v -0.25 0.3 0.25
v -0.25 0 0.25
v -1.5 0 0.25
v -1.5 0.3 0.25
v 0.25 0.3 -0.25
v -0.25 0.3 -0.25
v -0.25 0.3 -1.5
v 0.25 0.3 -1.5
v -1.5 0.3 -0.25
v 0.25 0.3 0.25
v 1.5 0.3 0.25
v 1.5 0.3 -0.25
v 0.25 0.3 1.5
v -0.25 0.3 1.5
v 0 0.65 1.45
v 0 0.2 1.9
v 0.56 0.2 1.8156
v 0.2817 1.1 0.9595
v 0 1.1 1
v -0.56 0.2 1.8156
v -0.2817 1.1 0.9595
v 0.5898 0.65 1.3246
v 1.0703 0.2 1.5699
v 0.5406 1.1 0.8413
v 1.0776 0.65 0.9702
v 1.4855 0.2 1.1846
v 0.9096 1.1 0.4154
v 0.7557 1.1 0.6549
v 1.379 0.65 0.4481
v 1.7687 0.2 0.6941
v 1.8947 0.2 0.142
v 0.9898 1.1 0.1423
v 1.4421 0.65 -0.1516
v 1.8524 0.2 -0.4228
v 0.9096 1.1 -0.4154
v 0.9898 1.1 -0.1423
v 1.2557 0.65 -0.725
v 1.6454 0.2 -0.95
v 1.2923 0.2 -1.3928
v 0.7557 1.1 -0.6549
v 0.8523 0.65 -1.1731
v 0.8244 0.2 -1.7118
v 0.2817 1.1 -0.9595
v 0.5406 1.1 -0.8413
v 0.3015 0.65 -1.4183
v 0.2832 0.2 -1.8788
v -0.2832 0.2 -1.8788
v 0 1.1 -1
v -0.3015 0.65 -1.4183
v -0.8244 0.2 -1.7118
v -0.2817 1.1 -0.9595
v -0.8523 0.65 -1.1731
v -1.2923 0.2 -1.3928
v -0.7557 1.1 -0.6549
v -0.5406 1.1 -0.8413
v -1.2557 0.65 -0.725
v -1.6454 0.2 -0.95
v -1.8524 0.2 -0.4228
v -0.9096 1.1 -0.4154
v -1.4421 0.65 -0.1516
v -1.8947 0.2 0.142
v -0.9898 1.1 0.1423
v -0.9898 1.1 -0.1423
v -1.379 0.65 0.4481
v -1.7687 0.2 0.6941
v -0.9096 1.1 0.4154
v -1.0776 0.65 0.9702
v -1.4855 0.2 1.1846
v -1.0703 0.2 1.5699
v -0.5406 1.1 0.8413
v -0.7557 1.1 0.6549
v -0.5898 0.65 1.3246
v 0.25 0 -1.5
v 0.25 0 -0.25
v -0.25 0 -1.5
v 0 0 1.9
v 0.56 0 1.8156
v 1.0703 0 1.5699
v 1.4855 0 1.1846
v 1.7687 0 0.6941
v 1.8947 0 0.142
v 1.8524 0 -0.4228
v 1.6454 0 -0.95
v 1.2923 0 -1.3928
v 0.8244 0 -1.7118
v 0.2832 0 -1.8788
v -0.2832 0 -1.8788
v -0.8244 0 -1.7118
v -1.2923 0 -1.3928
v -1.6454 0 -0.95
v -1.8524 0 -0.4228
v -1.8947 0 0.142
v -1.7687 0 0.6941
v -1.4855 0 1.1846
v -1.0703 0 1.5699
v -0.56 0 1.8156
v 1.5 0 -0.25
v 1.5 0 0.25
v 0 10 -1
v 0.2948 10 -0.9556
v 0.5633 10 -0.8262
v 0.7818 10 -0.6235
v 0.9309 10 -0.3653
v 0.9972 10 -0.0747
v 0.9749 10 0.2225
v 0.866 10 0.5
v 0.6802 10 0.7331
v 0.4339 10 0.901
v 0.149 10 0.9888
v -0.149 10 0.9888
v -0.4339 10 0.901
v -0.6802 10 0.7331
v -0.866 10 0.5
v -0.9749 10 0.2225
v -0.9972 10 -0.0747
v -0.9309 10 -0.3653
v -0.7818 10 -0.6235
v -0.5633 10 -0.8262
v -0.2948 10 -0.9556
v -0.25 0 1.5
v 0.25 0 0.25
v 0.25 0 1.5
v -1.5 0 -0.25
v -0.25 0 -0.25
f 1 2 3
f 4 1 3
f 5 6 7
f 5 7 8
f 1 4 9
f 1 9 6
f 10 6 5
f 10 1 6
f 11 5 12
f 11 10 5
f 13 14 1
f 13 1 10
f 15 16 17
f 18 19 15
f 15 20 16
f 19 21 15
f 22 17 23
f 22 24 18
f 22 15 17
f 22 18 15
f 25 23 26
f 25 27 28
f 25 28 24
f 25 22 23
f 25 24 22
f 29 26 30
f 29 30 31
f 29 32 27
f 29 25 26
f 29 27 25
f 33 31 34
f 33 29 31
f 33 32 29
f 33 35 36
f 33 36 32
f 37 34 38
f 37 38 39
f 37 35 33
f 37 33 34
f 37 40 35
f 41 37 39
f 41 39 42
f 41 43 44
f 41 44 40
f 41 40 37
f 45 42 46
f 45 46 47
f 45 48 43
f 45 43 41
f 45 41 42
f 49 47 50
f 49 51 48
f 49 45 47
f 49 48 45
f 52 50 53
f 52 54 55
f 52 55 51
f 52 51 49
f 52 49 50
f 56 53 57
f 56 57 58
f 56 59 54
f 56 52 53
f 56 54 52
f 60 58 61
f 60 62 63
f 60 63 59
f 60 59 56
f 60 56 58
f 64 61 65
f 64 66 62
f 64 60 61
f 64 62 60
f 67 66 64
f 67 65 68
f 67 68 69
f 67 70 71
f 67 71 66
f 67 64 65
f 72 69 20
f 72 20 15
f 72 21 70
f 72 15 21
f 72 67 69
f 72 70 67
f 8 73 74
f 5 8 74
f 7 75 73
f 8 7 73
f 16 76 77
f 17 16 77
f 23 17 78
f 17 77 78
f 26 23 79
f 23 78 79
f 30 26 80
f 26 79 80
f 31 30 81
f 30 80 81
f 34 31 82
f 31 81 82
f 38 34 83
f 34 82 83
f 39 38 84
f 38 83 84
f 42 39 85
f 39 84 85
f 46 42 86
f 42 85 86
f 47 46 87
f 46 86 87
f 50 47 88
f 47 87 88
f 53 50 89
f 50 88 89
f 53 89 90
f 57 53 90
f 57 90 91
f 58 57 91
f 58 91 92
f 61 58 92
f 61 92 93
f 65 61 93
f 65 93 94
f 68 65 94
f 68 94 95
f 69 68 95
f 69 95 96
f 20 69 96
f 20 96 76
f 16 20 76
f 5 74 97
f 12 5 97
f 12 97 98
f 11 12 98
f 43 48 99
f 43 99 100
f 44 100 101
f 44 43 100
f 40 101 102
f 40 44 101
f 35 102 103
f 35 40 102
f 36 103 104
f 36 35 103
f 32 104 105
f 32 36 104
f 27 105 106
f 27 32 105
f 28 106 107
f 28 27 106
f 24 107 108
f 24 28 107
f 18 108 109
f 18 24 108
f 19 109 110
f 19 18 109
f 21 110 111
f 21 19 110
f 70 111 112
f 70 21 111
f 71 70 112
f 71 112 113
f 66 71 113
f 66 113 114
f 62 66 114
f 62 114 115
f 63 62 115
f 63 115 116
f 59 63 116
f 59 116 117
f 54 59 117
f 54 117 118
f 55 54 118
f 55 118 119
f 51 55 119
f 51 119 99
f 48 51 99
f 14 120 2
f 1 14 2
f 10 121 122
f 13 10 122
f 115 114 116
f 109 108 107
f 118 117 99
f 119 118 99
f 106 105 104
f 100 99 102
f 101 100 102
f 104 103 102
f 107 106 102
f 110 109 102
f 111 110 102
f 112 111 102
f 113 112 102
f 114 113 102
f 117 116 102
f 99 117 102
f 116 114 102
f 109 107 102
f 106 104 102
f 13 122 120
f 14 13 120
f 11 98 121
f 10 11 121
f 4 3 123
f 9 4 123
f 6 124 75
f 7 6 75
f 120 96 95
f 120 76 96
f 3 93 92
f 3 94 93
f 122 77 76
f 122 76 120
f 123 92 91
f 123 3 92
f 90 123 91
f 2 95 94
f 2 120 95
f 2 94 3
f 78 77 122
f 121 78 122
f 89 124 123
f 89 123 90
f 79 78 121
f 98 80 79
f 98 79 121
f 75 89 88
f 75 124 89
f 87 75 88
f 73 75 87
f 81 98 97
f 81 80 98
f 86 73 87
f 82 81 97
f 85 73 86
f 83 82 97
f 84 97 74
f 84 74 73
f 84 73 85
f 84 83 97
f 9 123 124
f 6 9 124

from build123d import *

# Parameters (mm, degrees)
SKETCH1_R           = 1.9
BOSS_EXTRUDE1_DEPTH = 1.3
SKETCH2_R           = 1
BOSS_EXTRUDE2_DEPTH = 10
CHAMFER1_SIZE       = 1.1
CUT_EXTRUDE1_DEPTH  = 0.3


with BuildPart() as part:
    # Sketch1 → Boss-Extrude1 (new body)
    with BuildSketch(Plane(origin=(0, 0, 0), x_dir=(1, 0, 0), z_dir=(0, 1, 0))):
        with Locations(Location((0, 0, 0), (0, 0, 270))):
            Circle(SKETCH1_R)
    extrude(amount=BOSS_EXTRUDE1_DEPTH)

    # Sketch2 → Boss-Extrude2 (add)
    with BuildSketch(Plane.XZ):
        with Locations(Location((0, 0, 0), (0, 0, 270))):
            Circle(SKETCH2_R)
    extrude(amount=-BOSS_EXTRUDE2_DEPTH)

    # Chamfer1
    # the kernel refuses this chamfer: 1.1 mm, written as the material it takes off along each edge
    with BuildSketch(Plane(origin=(0, 1.3, 0), x_dir=(0, 0, 1), z_dir=(-1, 0, 0))) as chamfer1_piece_1_section:
        Polygon((1.9, -CHAMFER1_SIZE), (1.9 - CHAMFER1_SIZE, 0), (1.9, 0), align=None)
    chamfer1_piece_1 = revolve(axis=Axis((0, 1.3, 0), (0, 1, 0)), mode=Mode.PRIVATE)
    chamfer1_piece_1 = chamfer1_piece_1 - Plane(origin=(0, 0.647474875, 0), x_dir=(0, 0, -1), z_dir=(0, -1, 0)) * Cylinder(1, 8, mode=Mode.PRIVATE)
    add(chamfer1_piece_1, mode=Mode.SUBTRACT)

    # Sketch3 → Cut-Extrude1 (cut)
    with BuildSketch(Plane.XZ):
        Polygon((-0.25, 1.5), (-0.25, 0.25), (-1.5, 0.25), (-1.5, -0.25), (-0.25, -0.25), (-0.25, -1.5), (0.25, -1.5), (0.25, -0.25), (1.5, -0.25), (1.5, 0.25), (0.25, 0.25), (0.25, 1.5), align=None)
    extrude(amount=-CUT_EXTRUDE1_DEPTH, mode=Mode.SUBTRACT)


solid = part.part
